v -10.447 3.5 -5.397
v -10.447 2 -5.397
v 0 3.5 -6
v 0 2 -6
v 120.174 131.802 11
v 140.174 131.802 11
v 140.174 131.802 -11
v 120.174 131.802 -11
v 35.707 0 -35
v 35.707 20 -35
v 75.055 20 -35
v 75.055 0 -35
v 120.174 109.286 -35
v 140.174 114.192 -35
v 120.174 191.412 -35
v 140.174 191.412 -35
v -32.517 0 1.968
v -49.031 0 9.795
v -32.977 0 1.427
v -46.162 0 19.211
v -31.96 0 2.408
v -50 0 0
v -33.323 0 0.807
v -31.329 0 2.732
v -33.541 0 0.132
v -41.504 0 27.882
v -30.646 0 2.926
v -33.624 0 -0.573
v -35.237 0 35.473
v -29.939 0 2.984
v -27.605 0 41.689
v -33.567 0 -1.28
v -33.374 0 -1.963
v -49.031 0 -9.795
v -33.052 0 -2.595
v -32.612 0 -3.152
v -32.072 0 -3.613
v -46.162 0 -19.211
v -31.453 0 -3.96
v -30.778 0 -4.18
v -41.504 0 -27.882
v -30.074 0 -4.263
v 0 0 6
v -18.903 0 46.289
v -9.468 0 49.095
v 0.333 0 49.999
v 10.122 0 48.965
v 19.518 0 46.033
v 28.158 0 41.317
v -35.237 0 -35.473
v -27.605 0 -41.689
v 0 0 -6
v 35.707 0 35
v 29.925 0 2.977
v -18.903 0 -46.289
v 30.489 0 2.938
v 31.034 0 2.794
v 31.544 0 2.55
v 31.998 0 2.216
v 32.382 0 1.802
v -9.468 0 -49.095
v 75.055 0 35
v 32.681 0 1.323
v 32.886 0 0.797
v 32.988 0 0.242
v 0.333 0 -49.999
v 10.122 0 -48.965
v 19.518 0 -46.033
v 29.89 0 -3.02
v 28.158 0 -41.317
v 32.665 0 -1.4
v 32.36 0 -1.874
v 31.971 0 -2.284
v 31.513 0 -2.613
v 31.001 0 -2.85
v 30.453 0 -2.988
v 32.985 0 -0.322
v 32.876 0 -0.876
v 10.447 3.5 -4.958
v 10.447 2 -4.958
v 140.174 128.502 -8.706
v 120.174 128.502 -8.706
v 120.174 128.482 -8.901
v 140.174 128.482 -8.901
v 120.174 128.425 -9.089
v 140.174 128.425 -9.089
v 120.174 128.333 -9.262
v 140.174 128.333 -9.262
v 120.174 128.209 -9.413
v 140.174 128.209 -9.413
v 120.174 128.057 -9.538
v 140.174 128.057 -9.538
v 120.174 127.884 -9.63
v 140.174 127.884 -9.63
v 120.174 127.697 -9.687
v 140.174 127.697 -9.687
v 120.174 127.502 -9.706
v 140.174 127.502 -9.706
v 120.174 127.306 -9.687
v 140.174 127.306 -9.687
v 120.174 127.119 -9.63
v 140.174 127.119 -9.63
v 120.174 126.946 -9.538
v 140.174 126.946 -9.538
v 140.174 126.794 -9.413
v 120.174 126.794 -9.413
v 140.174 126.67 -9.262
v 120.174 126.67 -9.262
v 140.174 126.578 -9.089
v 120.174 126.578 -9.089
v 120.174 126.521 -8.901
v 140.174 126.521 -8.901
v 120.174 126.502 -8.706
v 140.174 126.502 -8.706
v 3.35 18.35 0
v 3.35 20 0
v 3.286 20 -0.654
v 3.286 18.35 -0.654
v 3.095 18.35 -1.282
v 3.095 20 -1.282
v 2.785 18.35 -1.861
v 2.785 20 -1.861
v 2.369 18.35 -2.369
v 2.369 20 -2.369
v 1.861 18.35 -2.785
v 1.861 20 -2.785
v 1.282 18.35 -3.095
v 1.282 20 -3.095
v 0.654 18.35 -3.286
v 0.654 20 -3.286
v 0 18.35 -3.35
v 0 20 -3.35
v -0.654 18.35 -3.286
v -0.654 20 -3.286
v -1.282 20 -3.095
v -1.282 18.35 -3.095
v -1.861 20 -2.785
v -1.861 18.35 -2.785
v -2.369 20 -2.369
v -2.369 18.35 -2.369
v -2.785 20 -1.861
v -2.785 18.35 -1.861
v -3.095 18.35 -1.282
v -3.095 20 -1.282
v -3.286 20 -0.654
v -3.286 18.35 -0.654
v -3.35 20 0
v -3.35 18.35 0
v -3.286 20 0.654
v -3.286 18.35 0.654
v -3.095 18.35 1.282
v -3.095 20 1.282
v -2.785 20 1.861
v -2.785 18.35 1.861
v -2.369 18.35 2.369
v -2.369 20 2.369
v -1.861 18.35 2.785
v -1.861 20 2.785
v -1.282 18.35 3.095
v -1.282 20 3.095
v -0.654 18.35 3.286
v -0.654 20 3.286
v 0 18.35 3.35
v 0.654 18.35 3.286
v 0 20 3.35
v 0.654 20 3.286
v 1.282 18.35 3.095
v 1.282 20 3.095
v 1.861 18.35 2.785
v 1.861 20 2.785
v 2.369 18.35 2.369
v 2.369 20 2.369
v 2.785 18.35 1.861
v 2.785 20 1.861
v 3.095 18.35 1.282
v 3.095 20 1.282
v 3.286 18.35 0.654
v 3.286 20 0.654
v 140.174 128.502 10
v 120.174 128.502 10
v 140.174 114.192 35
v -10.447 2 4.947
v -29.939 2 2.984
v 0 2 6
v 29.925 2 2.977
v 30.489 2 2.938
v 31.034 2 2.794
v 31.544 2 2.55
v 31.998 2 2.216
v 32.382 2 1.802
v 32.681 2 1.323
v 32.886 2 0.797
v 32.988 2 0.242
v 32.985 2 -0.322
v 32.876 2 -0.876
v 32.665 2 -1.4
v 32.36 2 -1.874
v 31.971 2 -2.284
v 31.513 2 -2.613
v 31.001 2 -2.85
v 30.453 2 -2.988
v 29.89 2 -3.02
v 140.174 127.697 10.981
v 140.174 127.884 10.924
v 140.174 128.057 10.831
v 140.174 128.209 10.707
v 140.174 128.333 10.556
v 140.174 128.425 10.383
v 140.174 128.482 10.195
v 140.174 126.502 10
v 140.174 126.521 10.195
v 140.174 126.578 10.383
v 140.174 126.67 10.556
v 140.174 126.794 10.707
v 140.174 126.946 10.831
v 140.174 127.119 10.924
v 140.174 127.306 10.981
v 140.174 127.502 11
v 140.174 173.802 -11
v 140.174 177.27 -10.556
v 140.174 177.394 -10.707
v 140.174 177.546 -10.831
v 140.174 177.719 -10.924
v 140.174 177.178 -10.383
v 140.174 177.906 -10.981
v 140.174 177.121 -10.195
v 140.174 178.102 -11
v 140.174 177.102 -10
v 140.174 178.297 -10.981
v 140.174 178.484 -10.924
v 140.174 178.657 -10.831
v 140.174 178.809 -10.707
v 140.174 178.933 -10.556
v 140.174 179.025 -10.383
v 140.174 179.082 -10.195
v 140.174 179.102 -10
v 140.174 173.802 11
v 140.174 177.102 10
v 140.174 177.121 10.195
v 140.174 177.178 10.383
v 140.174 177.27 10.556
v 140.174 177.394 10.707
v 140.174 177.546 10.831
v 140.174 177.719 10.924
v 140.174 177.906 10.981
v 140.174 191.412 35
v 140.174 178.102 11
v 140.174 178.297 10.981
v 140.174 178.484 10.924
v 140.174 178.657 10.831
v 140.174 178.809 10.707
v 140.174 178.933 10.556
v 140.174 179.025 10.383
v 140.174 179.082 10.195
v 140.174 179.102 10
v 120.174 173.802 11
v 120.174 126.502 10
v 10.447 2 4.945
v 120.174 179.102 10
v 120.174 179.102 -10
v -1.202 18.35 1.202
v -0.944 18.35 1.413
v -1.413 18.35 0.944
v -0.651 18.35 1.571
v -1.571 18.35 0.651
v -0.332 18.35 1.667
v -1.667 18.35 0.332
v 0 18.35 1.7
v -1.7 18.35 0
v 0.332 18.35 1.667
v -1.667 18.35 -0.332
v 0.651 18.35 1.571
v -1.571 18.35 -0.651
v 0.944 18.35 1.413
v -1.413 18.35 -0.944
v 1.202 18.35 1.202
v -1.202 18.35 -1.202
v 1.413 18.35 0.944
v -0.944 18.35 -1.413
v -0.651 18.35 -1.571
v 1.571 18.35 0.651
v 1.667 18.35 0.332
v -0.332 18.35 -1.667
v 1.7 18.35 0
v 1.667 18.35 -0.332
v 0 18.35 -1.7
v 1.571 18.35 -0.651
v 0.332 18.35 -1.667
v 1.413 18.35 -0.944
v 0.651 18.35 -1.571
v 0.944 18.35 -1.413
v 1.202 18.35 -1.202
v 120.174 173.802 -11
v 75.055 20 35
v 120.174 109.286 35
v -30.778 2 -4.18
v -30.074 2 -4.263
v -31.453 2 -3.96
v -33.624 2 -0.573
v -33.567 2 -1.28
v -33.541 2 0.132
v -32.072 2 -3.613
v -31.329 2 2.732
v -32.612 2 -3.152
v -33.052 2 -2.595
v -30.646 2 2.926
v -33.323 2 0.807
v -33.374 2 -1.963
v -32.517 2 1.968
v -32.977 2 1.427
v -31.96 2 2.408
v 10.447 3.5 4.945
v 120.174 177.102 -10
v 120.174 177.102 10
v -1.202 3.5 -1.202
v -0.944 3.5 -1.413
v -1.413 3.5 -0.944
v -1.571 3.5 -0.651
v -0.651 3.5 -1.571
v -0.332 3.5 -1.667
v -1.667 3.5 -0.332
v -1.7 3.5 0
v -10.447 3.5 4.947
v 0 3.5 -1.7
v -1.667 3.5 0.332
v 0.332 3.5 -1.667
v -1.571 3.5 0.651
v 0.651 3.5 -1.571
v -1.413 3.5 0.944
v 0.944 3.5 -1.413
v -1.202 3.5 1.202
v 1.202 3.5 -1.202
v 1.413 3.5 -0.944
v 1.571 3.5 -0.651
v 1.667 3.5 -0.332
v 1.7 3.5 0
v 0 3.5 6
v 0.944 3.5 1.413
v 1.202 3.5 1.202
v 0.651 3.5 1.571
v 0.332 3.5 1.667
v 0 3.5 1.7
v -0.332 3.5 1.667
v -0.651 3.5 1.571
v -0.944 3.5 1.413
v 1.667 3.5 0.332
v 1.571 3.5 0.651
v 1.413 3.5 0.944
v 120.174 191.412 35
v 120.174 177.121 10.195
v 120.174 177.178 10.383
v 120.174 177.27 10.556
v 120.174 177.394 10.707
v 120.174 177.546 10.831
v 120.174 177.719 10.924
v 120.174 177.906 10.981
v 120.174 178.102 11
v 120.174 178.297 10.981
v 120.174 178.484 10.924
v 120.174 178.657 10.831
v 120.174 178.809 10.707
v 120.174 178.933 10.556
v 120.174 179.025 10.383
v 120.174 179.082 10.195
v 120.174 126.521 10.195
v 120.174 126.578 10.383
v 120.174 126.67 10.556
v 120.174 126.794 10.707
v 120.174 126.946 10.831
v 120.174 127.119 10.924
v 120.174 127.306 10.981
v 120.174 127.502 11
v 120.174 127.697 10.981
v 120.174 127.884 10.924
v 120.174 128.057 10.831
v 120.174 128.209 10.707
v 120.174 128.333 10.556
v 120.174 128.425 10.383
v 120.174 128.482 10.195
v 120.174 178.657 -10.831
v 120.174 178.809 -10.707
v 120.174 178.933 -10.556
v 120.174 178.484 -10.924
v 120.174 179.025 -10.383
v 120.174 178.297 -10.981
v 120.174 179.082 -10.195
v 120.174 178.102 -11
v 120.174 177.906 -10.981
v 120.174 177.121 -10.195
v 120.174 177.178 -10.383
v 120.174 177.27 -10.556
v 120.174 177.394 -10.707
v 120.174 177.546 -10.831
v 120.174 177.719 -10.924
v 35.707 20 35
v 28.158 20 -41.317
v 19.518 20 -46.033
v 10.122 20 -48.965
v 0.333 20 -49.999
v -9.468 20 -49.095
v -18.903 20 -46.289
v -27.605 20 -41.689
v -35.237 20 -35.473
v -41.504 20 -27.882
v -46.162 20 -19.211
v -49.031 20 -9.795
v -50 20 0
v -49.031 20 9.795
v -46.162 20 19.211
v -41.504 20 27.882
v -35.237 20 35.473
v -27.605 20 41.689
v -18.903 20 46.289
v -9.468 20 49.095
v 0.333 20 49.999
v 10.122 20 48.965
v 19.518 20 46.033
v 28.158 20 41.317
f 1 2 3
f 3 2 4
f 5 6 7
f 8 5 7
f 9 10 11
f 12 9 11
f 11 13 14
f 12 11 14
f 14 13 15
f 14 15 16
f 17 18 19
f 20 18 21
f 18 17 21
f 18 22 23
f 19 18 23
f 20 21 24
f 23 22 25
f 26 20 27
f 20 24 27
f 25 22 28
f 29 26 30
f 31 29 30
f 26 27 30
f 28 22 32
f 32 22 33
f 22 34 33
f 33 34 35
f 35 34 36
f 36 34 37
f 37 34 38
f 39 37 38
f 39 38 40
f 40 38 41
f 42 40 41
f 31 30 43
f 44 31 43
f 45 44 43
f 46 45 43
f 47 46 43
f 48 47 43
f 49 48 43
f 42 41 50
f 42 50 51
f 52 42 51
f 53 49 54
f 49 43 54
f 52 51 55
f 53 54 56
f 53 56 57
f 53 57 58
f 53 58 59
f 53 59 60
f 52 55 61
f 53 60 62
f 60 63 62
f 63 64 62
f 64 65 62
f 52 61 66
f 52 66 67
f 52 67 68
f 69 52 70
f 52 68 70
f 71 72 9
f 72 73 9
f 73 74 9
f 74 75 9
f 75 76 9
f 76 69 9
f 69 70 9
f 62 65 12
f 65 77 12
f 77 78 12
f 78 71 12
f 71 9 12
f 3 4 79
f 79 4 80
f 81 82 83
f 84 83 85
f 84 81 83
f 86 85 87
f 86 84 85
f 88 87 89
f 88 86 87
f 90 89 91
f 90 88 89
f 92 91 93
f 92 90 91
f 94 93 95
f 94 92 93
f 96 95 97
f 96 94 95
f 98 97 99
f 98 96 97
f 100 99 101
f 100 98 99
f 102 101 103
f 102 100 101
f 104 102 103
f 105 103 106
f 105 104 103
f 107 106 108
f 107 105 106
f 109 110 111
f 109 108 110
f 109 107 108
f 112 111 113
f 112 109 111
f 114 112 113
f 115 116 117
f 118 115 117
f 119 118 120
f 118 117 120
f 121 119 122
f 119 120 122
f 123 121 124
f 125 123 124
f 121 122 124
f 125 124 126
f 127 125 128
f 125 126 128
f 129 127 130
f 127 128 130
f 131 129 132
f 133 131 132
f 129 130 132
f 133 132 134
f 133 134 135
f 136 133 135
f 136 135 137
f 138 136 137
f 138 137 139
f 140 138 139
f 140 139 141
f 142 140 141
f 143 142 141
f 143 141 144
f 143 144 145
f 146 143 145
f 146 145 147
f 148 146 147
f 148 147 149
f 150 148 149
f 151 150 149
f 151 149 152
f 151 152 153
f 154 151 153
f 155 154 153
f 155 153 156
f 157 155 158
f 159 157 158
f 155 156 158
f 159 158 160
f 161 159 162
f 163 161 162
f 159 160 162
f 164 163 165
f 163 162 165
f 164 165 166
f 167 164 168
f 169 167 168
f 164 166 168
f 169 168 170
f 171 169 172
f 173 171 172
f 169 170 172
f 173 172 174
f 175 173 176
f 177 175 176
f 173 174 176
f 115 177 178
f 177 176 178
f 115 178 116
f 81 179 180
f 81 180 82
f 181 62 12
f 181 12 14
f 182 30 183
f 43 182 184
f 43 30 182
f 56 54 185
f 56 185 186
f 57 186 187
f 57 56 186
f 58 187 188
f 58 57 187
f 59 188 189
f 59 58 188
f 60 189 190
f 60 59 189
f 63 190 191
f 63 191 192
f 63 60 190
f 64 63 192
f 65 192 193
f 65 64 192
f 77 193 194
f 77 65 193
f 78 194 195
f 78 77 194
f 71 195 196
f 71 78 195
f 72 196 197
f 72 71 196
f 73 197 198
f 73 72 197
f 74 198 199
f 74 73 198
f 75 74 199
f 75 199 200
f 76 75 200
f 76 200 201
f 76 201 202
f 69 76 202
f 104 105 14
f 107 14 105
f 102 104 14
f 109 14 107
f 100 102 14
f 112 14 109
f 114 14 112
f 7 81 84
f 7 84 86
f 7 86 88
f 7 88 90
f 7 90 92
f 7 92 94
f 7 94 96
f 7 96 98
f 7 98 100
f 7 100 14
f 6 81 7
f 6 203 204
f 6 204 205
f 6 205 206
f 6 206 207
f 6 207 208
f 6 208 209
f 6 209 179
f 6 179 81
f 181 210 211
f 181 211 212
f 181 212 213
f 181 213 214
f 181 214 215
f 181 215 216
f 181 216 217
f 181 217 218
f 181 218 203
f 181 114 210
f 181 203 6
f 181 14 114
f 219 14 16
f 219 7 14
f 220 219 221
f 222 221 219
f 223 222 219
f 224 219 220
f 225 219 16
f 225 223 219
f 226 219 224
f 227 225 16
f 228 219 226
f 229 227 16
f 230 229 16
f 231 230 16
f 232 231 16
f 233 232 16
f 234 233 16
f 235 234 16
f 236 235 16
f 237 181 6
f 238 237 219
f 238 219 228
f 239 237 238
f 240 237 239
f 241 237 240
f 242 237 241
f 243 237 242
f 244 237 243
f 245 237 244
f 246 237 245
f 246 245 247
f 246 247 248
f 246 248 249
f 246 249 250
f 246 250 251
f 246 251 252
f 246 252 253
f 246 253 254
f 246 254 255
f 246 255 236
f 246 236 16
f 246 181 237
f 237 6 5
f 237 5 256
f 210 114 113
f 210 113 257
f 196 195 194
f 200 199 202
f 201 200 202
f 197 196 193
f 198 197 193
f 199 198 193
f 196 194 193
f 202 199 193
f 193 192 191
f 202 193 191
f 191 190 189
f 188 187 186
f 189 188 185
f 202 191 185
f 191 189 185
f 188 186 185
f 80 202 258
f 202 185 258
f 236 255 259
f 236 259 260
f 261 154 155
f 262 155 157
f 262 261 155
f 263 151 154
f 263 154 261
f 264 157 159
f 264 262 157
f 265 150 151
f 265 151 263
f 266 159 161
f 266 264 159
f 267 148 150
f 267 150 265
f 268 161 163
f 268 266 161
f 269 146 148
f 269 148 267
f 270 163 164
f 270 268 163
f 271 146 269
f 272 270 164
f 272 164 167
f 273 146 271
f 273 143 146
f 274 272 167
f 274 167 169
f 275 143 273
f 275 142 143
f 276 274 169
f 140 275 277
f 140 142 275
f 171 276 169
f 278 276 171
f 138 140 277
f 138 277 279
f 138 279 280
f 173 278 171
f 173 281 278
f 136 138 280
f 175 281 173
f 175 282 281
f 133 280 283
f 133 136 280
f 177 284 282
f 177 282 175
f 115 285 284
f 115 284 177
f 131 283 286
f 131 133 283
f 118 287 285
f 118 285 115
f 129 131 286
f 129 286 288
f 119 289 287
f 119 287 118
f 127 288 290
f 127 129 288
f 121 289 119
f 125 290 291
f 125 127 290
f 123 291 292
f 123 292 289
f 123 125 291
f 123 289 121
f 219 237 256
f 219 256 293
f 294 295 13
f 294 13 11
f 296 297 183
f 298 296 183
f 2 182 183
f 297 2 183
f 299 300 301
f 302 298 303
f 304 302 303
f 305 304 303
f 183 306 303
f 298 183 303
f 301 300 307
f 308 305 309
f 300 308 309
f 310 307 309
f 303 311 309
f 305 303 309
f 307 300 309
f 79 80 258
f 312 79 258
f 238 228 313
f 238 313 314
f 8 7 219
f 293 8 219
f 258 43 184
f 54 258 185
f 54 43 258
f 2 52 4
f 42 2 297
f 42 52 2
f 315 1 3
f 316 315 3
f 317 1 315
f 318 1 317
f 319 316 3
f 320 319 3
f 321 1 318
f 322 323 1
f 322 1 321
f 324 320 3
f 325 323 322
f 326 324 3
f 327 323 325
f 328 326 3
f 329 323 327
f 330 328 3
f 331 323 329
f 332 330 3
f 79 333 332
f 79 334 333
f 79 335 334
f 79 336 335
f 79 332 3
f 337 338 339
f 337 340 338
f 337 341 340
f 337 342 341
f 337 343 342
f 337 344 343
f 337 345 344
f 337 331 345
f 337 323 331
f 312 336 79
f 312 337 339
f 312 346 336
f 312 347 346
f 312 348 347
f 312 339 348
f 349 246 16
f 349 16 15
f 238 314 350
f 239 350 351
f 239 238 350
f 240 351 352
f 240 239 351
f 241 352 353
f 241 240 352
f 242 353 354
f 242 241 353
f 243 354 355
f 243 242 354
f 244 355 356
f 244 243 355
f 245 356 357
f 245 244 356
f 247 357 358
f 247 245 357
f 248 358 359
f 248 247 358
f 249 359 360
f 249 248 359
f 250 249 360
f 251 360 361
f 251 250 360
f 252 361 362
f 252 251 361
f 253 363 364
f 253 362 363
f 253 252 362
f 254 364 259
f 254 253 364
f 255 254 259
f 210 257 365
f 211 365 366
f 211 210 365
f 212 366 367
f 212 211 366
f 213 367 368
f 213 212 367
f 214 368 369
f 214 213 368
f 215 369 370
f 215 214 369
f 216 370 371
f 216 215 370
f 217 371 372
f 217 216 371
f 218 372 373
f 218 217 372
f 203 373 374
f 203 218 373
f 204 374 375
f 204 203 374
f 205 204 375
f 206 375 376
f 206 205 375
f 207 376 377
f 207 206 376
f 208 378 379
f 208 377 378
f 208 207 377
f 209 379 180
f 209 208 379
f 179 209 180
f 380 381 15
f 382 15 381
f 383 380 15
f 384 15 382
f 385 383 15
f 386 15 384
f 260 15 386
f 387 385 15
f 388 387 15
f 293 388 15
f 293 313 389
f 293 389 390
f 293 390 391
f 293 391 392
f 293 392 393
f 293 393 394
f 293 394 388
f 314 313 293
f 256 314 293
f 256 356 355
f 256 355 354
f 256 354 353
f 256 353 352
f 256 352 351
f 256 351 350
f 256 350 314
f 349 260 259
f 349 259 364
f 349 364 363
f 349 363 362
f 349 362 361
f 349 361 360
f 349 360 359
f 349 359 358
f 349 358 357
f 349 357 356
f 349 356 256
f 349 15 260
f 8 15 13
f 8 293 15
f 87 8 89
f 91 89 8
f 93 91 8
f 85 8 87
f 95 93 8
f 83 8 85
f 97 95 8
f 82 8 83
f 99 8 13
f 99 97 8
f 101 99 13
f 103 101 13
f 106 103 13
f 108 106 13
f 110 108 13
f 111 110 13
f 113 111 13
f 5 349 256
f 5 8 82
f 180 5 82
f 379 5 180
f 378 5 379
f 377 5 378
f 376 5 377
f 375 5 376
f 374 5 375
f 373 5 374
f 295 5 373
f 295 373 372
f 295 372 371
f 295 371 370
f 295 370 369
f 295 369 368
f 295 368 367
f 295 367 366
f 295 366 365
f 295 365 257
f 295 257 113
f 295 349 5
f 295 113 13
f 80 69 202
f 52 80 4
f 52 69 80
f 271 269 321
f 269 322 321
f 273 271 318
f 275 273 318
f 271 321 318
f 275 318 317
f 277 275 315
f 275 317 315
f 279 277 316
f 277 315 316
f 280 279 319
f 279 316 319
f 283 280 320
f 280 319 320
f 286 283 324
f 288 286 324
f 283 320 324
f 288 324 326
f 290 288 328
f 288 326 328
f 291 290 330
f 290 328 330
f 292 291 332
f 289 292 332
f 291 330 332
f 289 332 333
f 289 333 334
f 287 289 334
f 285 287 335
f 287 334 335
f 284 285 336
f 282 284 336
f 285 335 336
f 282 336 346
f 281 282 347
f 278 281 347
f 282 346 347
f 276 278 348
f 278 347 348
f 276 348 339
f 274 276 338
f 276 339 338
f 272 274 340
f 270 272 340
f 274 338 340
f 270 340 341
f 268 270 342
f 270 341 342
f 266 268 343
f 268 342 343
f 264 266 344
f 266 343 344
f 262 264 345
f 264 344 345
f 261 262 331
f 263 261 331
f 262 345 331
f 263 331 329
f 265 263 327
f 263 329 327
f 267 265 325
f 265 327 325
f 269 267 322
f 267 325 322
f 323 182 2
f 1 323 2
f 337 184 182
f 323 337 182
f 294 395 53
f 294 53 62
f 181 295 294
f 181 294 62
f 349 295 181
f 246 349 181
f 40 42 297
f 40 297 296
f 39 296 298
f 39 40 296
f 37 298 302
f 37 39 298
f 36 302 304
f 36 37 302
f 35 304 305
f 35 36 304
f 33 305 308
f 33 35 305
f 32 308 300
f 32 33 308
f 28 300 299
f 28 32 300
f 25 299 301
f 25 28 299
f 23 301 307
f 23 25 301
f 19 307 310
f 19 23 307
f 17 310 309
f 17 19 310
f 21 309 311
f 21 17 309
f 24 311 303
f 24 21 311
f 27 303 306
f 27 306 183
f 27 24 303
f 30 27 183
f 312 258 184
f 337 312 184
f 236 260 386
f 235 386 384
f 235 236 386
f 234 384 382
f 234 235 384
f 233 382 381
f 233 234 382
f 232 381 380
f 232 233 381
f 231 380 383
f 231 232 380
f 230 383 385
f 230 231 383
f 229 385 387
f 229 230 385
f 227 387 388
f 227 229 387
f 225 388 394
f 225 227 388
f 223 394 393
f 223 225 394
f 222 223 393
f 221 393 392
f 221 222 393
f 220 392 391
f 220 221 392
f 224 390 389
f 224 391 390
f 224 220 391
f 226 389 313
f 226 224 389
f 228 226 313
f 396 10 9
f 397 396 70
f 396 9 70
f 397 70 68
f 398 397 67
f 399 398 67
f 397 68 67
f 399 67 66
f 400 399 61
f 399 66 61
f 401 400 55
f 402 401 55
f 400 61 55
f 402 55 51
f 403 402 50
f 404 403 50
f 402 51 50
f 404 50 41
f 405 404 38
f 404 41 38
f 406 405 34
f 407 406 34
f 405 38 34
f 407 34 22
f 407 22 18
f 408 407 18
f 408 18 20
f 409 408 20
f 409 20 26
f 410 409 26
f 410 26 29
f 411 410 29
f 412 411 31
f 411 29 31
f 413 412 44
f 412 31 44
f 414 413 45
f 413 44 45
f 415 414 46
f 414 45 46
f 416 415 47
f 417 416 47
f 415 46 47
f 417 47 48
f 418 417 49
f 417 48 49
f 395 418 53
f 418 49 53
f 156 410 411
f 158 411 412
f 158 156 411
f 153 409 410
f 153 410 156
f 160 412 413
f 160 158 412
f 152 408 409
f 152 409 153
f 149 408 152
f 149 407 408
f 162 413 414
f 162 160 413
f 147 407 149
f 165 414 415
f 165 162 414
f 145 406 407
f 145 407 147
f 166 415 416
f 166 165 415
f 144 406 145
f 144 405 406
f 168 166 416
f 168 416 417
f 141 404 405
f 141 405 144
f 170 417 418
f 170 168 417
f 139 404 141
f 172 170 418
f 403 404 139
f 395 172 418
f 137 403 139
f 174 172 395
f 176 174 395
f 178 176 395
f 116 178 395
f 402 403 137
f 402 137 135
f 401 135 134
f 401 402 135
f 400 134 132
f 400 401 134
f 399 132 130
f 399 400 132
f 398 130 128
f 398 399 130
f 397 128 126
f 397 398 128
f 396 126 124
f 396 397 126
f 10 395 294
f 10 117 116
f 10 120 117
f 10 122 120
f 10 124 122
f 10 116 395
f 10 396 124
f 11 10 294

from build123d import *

# Parameters (mm, degrees)
EXTRUDE_1_DEPTH        = 20
EXTRUDE_2_DEPTH        = 70
F_1_4_BASE_D           = 3.4
F_1_4_BASE_CBORE_D     = 6.7
F_1_4_BASE_CBORE_DEPTH = 1.65
SKETCH_11_W            = 22
SKETCH_11_H            = 42
CUT_EXTRUDE_1_DEPTH    = 32
CUT_EXTRUDE_2_DEPTH    = 67
CUT_EXTRUDE_3_DEPTH    = 2
CUT_EXTRUDE_4_DEPTH    = 3.5


with BuildPart() as part:
    # 草图1 → 凸台-拉伸1 (new body)
    with BuildSketch(Plane(origin=(0, 0, 0), x_dir=(1, 0, 0), z_dir=(0, 1, 0))):
        with BuildLine():
            Line((75.055476805, 35), (35.707142143, 35))
            ThreePointArc((35.707142143, 35), (46.289075964, 18.902948088), (50, 0))
            ThreePointArc((50, 0), (46.289075964, -18.902948088), (35.707142143, -35))
            Line((35.707142143, -35), (75.055476805, -35))
            Line((75.055476805, -35), (75.055476805, 35))
        make_face()
        with BuildLine():
            Line((0.055476805, -35), (0.055476805, 35))
            Line((0.055476805, 35), (35.707142143, 35))
            ThreePointArc((35.707142143, 35), (-50, 0), (35.707142143, -35))
            Line((35.707142143, -35), (0.055476805, -35))
        make_face()
        with BuildLine():
            Line((35.707142143, 35), (0.055476805, 35))
            Line((0.055476805, 35), (0.055476805, -35))
            Line((0.055476805, -35), (35.707142143, -35))
            ThreePointArc((35.707142143, -35), (46.289075964, -18.902948088), (50, 0))
            ThreePointArc((50, 0), (46.289075964, 18.902948088), (35.707142143, 35))
        make_face()
    extrude(amount=EXTRUDE_1_DEPTH)

    # 草图2 → 凸台-拉伸2 (add)
    with BuildSketch(Plane.XY.offset(35)):
        Polygon((75.055476805, 0), (140.174133177, 114.192122372), (140.174133177, 191.411564081), (120.174133177, 191.411564081), (120.174133177, 109.286292207), (75.055476805, 20), align=None)
    extrude(amount=-EXTRUDE_2_DEPTH)

    # 1/4 六角头螺钉的柱形沉头孔base (through all)
    with Locations(Plane(origin=(0, 20, 0), x_dir=(1, 0, 0), z_dir=(0, 1, 0))):
        with Locations((0, 0)):
            CounterBoreHole(F_1_4_BASE_D / 2, F_1_4_BASE_CBORE_D / 2, F_1_4_BASE_CBORE_DEPTH)

    # 草图11 → 切除-拉伸1 (cut)
    with BuildSketch(Plane(origin=(140.174133177, 0, 0), x_dir=(0, 0, -1), z_dir=(1, 0, 0))):
        with Locations((0, 152.801564081)):
            Rectangle(SKETCH_11_W, SKETCH_11_H)
    extrude(amount=-CUT_EXTRUDE_1_DEPTH, mode=Mode.SUBTRACT)

    # 草图14 → 切除-拉伸2 (cut)
    with BuildSketch(Plane(origin=(140.174133177, 0, 0), x_dir=(0, 0, -1), z_dir=(1, 0, 0))):
        with BuildLine():
            Line((-10, 179.101564081), (10, 179.101564081))
            ThreePointArc((10, 179.101564081), (11, 178.101564081), (10, 177.101564081))
            Line((10, 177.101564081), (-10, 177.101564081))
            ThreePointArc((-10, 177.101564081), (-11, 178.101564081), (-10, 179.101564081))
        make_face()
        with BuildLine():
            Line((-10, 128.501564081), (8.706275956, 128.501564081))
            ThreePointArc((8.706275956, 128.501564081), (9.706275956, 127.501564081), (8.706275956, 126.501564081))
            Line((8.706275956, 126.501564081), (-10, 126.501564081))
            ThreePointArc((-10, 126.501564081), (-11, 127.501564081), (-10, 128.501564081))
        make_face()
    extrude(amount=-CUT_EXTRUDE_2_DEPTH, mode=Mode.SUBTRACT)

    # 草图19 → 切除-拉伸3 (cut)
    with BuildSketch(Plane.XZ):
        with BuildLine():
            Line((-29.938978194, 2.983548036), (0, 6))
            Line((0, 6), (29.925496738, 2.977040035))
            ThreePointArc((29.925496738, 2.977040035), (32.999946297, -0.039985046), (29.889613095, -3.020003134))
            Line((29.889613095, -3.020003134), (0, -6))
            Line((0, -6), (-30.07371717, -4.263466486))
            ThreePointArc((-30.07371717, -4.263466486), (-33.623512821, -0.572707651), (-29.938978194, 2.983548036))
        make_face()
    extrude(amount=-CUT_EXTRUDE_3_DEPTH, mode=Mode.SUBTRACT)

    # 草图20 → 切除-拉伸4 (cut)
    with BuildSketch(Plane.XZ):
        Polygon((0, 6), (-10.447108364, 4.947418969), (-10.447108364, -5.396757185), (0, -6), (10.446834114, -4.958449786), (10.446834114, 4.944700515), align=None)
    extrude(amount=-CUT_EXTRUDE_4_DEPTH, mode=Mode.SUBTRACT)


solid = part.part
